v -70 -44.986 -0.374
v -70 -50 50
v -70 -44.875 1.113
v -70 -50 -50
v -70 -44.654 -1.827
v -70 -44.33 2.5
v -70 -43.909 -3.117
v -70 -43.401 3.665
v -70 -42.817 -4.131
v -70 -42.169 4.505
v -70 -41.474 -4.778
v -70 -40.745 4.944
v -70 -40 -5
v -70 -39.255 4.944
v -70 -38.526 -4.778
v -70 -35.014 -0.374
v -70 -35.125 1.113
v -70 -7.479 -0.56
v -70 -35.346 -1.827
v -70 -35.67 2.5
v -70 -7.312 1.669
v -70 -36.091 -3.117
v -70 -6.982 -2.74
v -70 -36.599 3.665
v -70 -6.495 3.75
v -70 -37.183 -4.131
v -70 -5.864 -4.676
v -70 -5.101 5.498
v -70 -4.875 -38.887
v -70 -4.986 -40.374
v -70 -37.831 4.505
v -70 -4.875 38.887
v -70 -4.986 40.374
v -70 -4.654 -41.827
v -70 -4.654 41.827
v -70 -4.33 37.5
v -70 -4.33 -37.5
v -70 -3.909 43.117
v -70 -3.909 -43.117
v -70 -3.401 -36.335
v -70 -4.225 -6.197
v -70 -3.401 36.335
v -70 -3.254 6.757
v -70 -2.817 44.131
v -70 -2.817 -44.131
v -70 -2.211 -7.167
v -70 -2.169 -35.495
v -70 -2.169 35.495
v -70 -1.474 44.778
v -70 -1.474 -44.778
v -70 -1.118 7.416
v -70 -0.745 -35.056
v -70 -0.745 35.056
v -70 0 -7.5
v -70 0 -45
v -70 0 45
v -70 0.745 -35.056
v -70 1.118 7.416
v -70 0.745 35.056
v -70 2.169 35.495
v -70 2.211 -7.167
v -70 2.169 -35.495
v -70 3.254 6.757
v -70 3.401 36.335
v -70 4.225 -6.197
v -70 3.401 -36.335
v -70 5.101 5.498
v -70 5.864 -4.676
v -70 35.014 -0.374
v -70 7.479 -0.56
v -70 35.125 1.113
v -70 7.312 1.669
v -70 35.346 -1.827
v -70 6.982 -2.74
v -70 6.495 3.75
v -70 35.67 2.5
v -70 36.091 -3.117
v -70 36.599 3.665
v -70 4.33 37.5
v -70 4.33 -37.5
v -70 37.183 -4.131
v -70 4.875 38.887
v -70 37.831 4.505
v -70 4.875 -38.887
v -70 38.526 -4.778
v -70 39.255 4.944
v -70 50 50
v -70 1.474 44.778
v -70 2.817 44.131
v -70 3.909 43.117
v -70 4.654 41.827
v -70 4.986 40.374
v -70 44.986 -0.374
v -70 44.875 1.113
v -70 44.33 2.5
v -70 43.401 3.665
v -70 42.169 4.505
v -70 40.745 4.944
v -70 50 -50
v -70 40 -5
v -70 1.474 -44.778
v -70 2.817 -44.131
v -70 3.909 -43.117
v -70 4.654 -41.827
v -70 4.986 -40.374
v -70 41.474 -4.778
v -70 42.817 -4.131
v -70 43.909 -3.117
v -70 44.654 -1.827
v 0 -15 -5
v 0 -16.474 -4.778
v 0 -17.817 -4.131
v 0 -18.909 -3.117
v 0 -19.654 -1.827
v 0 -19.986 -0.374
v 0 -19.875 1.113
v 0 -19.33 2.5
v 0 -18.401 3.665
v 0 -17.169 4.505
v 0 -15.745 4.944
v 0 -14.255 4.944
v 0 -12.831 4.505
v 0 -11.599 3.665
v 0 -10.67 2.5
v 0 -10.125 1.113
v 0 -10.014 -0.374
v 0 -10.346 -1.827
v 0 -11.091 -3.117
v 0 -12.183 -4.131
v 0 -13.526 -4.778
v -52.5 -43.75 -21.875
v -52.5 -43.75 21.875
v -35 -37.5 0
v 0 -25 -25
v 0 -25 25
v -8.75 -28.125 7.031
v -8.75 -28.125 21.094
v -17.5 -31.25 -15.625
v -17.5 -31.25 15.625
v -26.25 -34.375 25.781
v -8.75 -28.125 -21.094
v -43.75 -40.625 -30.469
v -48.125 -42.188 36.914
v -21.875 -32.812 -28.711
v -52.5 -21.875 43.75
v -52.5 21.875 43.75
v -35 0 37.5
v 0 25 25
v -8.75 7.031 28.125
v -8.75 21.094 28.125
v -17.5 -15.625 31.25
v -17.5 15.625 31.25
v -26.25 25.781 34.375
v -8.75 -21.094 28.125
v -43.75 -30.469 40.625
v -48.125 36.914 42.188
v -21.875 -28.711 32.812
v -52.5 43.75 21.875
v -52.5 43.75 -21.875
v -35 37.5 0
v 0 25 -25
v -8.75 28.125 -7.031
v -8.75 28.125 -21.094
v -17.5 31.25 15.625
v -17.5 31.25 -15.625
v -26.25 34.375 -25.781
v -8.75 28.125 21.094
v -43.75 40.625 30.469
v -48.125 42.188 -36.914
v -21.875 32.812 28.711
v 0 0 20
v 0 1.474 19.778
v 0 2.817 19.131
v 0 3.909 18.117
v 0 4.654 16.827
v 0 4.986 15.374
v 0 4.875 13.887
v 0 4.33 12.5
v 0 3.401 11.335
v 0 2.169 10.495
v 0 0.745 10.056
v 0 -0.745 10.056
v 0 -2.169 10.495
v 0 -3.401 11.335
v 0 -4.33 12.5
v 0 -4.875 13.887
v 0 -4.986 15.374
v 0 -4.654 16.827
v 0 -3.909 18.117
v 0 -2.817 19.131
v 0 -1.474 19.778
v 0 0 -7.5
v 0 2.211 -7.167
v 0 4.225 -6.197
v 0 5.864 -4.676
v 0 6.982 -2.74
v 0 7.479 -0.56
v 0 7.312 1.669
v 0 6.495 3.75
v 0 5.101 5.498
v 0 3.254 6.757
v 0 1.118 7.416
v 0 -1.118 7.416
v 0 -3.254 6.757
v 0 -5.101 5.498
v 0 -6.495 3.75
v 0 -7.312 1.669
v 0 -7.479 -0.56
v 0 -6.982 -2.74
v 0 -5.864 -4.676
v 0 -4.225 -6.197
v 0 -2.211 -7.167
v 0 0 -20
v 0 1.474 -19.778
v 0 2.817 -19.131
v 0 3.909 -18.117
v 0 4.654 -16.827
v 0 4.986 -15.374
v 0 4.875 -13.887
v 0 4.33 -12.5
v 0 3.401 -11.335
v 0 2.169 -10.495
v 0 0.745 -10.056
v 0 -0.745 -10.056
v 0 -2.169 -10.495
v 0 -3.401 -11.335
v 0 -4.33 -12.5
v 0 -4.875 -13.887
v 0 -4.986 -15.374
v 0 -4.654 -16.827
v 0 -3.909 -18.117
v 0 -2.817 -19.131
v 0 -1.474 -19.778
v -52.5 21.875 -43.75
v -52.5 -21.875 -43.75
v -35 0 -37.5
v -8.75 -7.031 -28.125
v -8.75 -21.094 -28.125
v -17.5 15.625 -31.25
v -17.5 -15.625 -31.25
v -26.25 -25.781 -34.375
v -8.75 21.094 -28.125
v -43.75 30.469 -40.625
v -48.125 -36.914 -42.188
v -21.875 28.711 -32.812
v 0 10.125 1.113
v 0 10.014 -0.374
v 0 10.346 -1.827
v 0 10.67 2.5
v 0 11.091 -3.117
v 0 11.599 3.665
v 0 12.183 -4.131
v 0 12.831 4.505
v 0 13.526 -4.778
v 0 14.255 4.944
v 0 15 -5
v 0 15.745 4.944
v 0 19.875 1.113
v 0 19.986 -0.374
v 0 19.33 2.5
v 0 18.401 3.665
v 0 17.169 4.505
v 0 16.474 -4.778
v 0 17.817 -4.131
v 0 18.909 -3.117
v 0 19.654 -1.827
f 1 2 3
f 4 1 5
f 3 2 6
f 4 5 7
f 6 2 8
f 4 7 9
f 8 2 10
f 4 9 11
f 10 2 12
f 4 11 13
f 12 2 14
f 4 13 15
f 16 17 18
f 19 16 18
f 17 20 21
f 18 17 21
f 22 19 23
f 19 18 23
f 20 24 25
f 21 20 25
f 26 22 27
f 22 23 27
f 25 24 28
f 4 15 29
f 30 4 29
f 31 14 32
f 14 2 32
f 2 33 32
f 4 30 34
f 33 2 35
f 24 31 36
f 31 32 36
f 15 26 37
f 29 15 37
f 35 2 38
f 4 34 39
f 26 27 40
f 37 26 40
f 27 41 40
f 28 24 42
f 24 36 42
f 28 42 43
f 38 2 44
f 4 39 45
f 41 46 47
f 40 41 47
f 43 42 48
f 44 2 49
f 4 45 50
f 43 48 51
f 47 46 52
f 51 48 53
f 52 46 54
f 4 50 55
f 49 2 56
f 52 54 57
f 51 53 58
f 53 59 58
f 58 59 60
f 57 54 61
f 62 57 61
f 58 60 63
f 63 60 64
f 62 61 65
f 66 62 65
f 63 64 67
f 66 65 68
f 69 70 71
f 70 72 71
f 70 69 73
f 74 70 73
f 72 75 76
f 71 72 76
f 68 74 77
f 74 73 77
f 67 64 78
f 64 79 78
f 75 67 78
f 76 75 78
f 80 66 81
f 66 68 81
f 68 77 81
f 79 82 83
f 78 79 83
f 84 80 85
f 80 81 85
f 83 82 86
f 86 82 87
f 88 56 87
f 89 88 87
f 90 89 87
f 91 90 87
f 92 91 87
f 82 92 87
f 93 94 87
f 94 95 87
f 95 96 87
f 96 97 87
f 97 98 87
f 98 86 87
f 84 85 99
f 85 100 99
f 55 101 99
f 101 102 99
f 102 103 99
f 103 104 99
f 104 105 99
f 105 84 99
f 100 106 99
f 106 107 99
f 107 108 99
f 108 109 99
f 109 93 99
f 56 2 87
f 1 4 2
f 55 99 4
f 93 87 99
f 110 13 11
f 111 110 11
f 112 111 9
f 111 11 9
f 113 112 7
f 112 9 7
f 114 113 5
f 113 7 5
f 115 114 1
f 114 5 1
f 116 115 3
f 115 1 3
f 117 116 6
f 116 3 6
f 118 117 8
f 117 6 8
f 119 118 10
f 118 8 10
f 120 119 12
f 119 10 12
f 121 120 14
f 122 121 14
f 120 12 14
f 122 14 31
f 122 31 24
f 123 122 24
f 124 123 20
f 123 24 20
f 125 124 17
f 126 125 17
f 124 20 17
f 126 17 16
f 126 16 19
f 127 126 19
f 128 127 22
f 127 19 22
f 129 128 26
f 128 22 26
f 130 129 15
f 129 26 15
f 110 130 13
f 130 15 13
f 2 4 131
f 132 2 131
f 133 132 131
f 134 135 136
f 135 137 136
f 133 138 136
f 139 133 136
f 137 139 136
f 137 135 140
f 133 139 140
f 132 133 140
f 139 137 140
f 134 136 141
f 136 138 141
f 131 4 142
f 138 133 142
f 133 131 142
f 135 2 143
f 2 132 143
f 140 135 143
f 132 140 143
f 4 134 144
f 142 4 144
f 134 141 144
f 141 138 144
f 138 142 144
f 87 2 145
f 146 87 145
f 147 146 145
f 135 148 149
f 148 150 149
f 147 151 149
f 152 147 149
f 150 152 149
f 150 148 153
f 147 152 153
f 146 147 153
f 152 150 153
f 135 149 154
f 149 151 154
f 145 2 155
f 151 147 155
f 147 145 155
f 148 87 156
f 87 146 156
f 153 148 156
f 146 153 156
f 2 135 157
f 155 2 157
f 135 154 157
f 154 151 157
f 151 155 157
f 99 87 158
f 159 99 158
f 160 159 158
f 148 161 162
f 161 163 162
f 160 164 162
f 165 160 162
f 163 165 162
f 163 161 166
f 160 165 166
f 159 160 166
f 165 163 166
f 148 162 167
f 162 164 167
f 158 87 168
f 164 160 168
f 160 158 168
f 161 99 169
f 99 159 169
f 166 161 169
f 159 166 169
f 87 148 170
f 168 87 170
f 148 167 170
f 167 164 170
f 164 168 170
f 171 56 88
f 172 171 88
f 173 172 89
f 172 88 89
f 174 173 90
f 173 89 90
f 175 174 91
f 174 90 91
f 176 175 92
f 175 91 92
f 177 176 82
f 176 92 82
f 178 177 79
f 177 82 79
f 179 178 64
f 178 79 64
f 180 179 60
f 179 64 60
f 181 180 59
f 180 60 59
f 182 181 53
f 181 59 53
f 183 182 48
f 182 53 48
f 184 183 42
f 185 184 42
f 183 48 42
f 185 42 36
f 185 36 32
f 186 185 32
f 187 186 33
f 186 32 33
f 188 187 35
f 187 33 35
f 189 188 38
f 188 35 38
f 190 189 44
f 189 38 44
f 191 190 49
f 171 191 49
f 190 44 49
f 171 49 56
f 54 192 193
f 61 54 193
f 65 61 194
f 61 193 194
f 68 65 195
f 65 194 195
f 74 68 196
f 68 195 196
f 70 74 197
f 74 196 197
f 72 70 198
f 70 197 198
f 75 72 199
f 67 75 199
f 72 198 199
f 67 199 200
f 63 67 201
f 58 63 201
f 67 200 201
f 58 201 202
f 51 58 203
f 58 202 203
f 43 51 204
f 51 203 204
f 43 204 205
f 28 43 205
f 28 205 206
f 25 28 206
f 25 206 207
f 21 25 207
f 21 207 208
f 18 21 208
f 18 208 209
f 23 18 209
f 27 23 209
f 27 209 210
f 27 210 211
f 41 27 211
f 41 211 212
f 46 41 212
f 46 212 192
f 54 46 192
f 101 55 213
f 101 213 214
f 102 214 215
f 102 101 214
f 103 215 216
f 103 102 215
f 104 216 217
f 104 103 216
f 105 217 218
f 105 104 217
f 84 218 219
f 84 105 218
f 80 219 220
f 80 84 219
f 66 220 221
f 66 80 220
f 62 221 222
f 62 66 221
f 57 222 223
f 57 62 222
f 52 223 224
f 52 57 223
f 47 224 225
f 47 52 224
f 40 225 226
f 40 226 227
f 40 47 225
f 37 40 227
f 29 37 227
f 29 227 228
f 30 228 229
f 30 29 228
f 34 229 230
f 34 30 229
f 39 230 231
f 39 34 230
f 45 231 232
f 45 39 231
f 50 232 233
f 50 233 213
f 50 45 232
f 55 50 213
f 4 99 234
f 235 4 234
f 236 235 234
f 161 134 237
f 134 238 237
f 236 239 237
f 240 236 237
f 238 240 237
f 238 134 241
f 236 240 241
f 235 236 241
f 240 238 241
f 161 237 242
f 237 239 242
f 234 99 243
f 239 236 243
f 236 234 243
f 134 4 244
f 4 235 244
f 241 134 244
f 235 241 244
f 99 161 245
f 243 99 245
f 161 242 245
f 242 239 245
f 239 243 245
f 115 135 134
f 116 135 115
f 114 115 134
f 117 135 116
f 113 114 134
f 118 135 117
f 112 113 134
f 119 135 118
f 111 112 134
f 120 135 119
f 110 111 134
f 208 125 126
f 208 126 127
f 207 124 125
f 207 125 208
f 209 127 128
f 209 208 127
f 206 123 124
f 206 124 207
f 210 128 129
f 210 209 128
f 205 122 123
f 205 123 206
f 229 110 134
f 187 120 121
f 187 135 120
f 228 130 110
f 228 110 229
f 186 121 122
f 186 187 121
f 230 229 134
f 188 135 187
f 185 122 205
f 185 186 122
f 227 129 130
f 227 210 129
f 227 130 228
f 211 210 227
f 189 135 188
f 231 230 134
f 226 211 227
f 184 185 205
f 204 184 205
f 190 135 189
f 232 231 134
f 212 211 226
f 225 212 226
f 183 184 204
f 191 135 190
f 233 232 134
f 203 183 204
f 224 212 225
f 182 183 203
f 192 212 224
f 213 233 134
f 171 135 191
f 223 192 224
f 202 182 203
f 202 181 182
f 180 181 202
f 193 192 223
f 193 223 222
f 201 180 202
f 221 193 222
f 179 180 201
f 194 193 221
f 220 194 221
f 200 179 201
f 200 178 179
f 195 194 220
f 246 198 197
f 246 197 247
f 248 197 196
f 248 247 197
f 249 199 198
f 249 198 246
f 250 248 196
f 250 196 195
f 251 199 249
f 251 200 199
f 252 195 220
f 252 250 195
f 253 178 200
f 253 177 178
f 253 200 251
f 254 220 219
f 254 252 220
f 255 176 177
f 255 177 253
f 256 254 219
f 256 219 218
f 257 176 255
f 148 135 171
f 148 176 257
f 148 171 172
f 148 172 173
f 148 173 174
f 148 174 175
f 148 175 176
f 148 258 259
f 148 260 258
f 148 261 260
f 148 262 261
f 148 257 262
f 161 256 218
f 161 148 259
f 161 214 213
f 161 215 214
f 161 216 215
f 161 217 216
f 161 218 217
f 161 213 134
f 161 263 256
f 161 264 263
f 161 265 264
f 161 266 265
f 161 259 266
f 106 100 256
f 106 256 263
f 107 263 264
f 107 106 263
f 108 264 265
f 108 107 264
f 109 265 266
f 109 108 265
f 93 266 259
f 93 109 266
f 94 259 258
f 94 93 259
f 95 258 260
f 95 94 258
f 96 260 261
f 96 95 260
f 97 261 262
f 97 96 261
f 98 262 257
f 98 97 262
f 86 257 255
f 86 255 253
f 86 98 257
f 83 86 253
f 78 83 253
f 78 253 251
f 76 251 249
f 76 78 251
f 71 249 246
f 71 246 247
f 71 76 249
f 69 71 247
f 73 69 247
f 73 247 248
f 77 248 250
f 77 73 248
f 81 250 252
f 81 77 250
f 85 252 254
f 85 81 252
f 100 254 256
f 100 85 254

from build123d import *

# Parameters (mm, degrees)
SKETCH1_W          = 50
SKETCH1_H          = 50
SKETCH2_W          = 100
SKETCH2_H          = 100
SKETCH3_R          = 5
SKETCH6_R          = 5
SKETCH7_R          = 7.5
CUT_EXTRUDE1_DEPTH = 71.0000001


with BuildPart() as part:
    # Sketch1 → Loft1 section 0
    with BuildSketch(Plane(origin=(0, 0, 0), x_dir=(0, 0, -1), z_dir=(1, 0, 0))):
        Rectangle(SKETCH1_W, SKETCH1_H)
    # Sketch2 → Loft1 section 1
    with BuildSketch(Plane(origin=(-70, 0, 0), x_dir=(0, 0, -1), z_dir=(1, 0, 0))):
        Rectangle(SKETCH2_W, SKETCH2_H)
    loft()

    # Cut-Sweep2: sweep along a path in Sketch4
    with BuildLine(Plane(origin=(0, 0, 0), x_dir=(1, 0, 0), z_dir=(0, 1, 0))) as cut_sweep2_path:
        Line((0, 15), (-70, 40))
    # Sketch3 → Cut-Sweep2 (sweep, cut)
    with BuildSketch(Plane(origin=(0, 0, 0), x_dir=(0, 0, -1), z_dir=(1, 0, 0))):
        with Locations((15, 0)):
            Circle(SKETCH3_R)
    cut_sweep2 = sweep(path=cut_sweep2_path.line, mode=Mode.SUBTRACT)

    # Cut-Sweep3: sweep along a path in Sketch5
    with BuildLine(Plane.XY) as cut_sweep3_path:
        Line((0, 15), (-70, 40))
    # Sketch6 → Cut-Sweep3 (sweep, cut)
    with BuildSketch(Plane(origin=(0, 0, 0), x_dir=(0, 0, -1), z_dir=(1, 0, 0))):
        with Locations((0, 15)):
            Circle(SKETCH6_R)
    cut_sweep3 = sweep(path=cut_sweep3_path.line, mode=Mode.SUBTRACT)

    # Mirror1: Cut-Sweep2 across plane
    add(cut_sweep2.mirror(Plane.XY), mode=Mode.SUBTRACT)

    # Mirror2: Cut-Sweep3 across plane
    add(cut_sweep3.mirror(Plane.ZX), mode=Mode.SUBTRACT)

    # Sketch7 → Cut-Extrude1 (cut, through all)
    with BuildSketch(Plane(origin=(0, 0, 0), x_dir=(0, 0, -1), z_dir=(1, 0, 0))):
        Circle(SKETCH7_R)
    extrude(amount=-CUT_EXTRUDE1_DEPTH, mode=Mode.SUBTRACT)


solid = part.part
